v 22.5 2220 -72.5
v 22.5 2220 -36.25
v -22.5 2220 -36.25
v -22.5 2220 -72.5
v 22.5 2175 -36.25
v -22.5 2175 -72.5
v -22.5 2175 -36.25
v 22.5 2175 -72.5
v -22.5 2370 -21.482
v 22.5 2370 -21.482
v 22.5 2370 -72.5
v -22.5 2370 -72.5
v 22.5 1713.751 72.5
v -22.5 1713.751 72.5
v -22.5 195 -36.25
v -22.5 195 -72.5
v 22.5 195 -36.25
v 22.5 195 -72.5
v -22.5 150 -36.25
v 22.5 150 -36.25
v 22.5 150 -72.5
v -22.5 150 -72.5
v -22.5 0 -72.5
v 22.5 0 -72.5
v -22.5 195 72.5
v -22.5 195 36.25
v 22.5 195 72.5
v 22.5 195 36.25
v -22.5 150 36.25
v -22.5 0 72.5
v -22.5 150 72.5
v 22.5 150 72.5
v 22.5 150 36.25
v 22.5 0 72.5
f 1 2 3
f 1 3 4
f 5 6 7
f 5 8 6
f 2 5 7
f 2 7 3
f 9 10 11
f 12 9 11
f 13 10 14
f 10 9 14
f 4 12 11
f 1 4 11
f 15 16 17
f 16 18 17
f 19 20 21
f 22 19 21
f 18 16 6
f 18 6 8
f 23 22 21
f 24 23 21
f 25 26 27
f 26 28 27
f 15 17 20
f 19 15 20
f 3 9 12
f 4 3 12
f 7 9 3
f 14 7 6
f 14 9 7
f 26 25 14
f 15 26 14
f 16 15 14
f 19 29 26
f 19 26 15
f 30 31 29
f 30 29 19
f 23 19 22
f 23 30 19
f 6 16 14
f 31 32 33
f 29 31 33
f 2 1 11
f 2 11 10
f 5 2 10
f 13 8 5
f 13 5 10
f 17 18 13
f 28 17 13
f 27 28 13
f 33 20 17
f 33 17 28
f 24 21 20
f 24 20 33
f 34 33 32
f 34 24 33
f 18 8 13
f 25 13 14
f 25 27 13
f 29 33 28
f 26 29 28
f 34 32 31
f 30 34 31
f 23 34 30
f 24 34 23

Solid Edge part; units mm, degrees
sketch "Sketch1" plane through (0, 0, 0) normal (0, -1, 0) x (1, 0, 0)
  line L0 (-22.5, -72.5) -> (22.5, -72.5)
  line L1 (22.5, -72.5) -> (22.5, 72.5)
  line L2 (22.5, 72.5) -> (-22.5, 72.5)
  line L3 (-22.5, 72.5) -> (-22.5, -72.5)
extrude "Protrusion1" add sketch "Sketch1" against normal blind 2370
sketch "Sketch2" plane through (22.5, 1185, 0) normal (1, 0, 0) x (0, 1, 0)
  line L0 (1035, 72.5) -> (1035, 36.25)
  line L1 (1035, 36.25) -> (990, 36.25)
  line L2 (990, 36.25) -> (990, 72.5)
  line L3 (990, 72.5) -> (1035, 72.5)
  line L4 (-1035, 72.5) -> (-1035, 36.25)
  line L5 (-1035, 36.25) -> (-990, 36.25)
  line L6 (-990, 36.25) -> (-990, 72.5)
  line L7 (-990, 72.5) -> (-1035, 72.5)
extrude "ExtrudedCutout_1" cut sketch "Sketch2" against normal blind 89.2118
mirror "Mirror1" about plane through (0, 0, 0) normal (0, 0, -1) of "ExtrudedCutout_1"
sketch "Sketch3" plane through (-22.5, 1185, 0) normal (-1, 0, 0) x (0, -1, 0)
  line L0 (-1185, -21.4815) -> (-508.4584, 75.4061)
  line L1 (-508.4584, 75.4061) -> (-1185, 75.4061)
  line L2 (-1185, 75.4061) -> (-1185, -21.4815)
extrude "ExtrudedCutout_3" cut sketch "Sketch3" against normal blind 291.9601
properties material "Wood, Pine"
